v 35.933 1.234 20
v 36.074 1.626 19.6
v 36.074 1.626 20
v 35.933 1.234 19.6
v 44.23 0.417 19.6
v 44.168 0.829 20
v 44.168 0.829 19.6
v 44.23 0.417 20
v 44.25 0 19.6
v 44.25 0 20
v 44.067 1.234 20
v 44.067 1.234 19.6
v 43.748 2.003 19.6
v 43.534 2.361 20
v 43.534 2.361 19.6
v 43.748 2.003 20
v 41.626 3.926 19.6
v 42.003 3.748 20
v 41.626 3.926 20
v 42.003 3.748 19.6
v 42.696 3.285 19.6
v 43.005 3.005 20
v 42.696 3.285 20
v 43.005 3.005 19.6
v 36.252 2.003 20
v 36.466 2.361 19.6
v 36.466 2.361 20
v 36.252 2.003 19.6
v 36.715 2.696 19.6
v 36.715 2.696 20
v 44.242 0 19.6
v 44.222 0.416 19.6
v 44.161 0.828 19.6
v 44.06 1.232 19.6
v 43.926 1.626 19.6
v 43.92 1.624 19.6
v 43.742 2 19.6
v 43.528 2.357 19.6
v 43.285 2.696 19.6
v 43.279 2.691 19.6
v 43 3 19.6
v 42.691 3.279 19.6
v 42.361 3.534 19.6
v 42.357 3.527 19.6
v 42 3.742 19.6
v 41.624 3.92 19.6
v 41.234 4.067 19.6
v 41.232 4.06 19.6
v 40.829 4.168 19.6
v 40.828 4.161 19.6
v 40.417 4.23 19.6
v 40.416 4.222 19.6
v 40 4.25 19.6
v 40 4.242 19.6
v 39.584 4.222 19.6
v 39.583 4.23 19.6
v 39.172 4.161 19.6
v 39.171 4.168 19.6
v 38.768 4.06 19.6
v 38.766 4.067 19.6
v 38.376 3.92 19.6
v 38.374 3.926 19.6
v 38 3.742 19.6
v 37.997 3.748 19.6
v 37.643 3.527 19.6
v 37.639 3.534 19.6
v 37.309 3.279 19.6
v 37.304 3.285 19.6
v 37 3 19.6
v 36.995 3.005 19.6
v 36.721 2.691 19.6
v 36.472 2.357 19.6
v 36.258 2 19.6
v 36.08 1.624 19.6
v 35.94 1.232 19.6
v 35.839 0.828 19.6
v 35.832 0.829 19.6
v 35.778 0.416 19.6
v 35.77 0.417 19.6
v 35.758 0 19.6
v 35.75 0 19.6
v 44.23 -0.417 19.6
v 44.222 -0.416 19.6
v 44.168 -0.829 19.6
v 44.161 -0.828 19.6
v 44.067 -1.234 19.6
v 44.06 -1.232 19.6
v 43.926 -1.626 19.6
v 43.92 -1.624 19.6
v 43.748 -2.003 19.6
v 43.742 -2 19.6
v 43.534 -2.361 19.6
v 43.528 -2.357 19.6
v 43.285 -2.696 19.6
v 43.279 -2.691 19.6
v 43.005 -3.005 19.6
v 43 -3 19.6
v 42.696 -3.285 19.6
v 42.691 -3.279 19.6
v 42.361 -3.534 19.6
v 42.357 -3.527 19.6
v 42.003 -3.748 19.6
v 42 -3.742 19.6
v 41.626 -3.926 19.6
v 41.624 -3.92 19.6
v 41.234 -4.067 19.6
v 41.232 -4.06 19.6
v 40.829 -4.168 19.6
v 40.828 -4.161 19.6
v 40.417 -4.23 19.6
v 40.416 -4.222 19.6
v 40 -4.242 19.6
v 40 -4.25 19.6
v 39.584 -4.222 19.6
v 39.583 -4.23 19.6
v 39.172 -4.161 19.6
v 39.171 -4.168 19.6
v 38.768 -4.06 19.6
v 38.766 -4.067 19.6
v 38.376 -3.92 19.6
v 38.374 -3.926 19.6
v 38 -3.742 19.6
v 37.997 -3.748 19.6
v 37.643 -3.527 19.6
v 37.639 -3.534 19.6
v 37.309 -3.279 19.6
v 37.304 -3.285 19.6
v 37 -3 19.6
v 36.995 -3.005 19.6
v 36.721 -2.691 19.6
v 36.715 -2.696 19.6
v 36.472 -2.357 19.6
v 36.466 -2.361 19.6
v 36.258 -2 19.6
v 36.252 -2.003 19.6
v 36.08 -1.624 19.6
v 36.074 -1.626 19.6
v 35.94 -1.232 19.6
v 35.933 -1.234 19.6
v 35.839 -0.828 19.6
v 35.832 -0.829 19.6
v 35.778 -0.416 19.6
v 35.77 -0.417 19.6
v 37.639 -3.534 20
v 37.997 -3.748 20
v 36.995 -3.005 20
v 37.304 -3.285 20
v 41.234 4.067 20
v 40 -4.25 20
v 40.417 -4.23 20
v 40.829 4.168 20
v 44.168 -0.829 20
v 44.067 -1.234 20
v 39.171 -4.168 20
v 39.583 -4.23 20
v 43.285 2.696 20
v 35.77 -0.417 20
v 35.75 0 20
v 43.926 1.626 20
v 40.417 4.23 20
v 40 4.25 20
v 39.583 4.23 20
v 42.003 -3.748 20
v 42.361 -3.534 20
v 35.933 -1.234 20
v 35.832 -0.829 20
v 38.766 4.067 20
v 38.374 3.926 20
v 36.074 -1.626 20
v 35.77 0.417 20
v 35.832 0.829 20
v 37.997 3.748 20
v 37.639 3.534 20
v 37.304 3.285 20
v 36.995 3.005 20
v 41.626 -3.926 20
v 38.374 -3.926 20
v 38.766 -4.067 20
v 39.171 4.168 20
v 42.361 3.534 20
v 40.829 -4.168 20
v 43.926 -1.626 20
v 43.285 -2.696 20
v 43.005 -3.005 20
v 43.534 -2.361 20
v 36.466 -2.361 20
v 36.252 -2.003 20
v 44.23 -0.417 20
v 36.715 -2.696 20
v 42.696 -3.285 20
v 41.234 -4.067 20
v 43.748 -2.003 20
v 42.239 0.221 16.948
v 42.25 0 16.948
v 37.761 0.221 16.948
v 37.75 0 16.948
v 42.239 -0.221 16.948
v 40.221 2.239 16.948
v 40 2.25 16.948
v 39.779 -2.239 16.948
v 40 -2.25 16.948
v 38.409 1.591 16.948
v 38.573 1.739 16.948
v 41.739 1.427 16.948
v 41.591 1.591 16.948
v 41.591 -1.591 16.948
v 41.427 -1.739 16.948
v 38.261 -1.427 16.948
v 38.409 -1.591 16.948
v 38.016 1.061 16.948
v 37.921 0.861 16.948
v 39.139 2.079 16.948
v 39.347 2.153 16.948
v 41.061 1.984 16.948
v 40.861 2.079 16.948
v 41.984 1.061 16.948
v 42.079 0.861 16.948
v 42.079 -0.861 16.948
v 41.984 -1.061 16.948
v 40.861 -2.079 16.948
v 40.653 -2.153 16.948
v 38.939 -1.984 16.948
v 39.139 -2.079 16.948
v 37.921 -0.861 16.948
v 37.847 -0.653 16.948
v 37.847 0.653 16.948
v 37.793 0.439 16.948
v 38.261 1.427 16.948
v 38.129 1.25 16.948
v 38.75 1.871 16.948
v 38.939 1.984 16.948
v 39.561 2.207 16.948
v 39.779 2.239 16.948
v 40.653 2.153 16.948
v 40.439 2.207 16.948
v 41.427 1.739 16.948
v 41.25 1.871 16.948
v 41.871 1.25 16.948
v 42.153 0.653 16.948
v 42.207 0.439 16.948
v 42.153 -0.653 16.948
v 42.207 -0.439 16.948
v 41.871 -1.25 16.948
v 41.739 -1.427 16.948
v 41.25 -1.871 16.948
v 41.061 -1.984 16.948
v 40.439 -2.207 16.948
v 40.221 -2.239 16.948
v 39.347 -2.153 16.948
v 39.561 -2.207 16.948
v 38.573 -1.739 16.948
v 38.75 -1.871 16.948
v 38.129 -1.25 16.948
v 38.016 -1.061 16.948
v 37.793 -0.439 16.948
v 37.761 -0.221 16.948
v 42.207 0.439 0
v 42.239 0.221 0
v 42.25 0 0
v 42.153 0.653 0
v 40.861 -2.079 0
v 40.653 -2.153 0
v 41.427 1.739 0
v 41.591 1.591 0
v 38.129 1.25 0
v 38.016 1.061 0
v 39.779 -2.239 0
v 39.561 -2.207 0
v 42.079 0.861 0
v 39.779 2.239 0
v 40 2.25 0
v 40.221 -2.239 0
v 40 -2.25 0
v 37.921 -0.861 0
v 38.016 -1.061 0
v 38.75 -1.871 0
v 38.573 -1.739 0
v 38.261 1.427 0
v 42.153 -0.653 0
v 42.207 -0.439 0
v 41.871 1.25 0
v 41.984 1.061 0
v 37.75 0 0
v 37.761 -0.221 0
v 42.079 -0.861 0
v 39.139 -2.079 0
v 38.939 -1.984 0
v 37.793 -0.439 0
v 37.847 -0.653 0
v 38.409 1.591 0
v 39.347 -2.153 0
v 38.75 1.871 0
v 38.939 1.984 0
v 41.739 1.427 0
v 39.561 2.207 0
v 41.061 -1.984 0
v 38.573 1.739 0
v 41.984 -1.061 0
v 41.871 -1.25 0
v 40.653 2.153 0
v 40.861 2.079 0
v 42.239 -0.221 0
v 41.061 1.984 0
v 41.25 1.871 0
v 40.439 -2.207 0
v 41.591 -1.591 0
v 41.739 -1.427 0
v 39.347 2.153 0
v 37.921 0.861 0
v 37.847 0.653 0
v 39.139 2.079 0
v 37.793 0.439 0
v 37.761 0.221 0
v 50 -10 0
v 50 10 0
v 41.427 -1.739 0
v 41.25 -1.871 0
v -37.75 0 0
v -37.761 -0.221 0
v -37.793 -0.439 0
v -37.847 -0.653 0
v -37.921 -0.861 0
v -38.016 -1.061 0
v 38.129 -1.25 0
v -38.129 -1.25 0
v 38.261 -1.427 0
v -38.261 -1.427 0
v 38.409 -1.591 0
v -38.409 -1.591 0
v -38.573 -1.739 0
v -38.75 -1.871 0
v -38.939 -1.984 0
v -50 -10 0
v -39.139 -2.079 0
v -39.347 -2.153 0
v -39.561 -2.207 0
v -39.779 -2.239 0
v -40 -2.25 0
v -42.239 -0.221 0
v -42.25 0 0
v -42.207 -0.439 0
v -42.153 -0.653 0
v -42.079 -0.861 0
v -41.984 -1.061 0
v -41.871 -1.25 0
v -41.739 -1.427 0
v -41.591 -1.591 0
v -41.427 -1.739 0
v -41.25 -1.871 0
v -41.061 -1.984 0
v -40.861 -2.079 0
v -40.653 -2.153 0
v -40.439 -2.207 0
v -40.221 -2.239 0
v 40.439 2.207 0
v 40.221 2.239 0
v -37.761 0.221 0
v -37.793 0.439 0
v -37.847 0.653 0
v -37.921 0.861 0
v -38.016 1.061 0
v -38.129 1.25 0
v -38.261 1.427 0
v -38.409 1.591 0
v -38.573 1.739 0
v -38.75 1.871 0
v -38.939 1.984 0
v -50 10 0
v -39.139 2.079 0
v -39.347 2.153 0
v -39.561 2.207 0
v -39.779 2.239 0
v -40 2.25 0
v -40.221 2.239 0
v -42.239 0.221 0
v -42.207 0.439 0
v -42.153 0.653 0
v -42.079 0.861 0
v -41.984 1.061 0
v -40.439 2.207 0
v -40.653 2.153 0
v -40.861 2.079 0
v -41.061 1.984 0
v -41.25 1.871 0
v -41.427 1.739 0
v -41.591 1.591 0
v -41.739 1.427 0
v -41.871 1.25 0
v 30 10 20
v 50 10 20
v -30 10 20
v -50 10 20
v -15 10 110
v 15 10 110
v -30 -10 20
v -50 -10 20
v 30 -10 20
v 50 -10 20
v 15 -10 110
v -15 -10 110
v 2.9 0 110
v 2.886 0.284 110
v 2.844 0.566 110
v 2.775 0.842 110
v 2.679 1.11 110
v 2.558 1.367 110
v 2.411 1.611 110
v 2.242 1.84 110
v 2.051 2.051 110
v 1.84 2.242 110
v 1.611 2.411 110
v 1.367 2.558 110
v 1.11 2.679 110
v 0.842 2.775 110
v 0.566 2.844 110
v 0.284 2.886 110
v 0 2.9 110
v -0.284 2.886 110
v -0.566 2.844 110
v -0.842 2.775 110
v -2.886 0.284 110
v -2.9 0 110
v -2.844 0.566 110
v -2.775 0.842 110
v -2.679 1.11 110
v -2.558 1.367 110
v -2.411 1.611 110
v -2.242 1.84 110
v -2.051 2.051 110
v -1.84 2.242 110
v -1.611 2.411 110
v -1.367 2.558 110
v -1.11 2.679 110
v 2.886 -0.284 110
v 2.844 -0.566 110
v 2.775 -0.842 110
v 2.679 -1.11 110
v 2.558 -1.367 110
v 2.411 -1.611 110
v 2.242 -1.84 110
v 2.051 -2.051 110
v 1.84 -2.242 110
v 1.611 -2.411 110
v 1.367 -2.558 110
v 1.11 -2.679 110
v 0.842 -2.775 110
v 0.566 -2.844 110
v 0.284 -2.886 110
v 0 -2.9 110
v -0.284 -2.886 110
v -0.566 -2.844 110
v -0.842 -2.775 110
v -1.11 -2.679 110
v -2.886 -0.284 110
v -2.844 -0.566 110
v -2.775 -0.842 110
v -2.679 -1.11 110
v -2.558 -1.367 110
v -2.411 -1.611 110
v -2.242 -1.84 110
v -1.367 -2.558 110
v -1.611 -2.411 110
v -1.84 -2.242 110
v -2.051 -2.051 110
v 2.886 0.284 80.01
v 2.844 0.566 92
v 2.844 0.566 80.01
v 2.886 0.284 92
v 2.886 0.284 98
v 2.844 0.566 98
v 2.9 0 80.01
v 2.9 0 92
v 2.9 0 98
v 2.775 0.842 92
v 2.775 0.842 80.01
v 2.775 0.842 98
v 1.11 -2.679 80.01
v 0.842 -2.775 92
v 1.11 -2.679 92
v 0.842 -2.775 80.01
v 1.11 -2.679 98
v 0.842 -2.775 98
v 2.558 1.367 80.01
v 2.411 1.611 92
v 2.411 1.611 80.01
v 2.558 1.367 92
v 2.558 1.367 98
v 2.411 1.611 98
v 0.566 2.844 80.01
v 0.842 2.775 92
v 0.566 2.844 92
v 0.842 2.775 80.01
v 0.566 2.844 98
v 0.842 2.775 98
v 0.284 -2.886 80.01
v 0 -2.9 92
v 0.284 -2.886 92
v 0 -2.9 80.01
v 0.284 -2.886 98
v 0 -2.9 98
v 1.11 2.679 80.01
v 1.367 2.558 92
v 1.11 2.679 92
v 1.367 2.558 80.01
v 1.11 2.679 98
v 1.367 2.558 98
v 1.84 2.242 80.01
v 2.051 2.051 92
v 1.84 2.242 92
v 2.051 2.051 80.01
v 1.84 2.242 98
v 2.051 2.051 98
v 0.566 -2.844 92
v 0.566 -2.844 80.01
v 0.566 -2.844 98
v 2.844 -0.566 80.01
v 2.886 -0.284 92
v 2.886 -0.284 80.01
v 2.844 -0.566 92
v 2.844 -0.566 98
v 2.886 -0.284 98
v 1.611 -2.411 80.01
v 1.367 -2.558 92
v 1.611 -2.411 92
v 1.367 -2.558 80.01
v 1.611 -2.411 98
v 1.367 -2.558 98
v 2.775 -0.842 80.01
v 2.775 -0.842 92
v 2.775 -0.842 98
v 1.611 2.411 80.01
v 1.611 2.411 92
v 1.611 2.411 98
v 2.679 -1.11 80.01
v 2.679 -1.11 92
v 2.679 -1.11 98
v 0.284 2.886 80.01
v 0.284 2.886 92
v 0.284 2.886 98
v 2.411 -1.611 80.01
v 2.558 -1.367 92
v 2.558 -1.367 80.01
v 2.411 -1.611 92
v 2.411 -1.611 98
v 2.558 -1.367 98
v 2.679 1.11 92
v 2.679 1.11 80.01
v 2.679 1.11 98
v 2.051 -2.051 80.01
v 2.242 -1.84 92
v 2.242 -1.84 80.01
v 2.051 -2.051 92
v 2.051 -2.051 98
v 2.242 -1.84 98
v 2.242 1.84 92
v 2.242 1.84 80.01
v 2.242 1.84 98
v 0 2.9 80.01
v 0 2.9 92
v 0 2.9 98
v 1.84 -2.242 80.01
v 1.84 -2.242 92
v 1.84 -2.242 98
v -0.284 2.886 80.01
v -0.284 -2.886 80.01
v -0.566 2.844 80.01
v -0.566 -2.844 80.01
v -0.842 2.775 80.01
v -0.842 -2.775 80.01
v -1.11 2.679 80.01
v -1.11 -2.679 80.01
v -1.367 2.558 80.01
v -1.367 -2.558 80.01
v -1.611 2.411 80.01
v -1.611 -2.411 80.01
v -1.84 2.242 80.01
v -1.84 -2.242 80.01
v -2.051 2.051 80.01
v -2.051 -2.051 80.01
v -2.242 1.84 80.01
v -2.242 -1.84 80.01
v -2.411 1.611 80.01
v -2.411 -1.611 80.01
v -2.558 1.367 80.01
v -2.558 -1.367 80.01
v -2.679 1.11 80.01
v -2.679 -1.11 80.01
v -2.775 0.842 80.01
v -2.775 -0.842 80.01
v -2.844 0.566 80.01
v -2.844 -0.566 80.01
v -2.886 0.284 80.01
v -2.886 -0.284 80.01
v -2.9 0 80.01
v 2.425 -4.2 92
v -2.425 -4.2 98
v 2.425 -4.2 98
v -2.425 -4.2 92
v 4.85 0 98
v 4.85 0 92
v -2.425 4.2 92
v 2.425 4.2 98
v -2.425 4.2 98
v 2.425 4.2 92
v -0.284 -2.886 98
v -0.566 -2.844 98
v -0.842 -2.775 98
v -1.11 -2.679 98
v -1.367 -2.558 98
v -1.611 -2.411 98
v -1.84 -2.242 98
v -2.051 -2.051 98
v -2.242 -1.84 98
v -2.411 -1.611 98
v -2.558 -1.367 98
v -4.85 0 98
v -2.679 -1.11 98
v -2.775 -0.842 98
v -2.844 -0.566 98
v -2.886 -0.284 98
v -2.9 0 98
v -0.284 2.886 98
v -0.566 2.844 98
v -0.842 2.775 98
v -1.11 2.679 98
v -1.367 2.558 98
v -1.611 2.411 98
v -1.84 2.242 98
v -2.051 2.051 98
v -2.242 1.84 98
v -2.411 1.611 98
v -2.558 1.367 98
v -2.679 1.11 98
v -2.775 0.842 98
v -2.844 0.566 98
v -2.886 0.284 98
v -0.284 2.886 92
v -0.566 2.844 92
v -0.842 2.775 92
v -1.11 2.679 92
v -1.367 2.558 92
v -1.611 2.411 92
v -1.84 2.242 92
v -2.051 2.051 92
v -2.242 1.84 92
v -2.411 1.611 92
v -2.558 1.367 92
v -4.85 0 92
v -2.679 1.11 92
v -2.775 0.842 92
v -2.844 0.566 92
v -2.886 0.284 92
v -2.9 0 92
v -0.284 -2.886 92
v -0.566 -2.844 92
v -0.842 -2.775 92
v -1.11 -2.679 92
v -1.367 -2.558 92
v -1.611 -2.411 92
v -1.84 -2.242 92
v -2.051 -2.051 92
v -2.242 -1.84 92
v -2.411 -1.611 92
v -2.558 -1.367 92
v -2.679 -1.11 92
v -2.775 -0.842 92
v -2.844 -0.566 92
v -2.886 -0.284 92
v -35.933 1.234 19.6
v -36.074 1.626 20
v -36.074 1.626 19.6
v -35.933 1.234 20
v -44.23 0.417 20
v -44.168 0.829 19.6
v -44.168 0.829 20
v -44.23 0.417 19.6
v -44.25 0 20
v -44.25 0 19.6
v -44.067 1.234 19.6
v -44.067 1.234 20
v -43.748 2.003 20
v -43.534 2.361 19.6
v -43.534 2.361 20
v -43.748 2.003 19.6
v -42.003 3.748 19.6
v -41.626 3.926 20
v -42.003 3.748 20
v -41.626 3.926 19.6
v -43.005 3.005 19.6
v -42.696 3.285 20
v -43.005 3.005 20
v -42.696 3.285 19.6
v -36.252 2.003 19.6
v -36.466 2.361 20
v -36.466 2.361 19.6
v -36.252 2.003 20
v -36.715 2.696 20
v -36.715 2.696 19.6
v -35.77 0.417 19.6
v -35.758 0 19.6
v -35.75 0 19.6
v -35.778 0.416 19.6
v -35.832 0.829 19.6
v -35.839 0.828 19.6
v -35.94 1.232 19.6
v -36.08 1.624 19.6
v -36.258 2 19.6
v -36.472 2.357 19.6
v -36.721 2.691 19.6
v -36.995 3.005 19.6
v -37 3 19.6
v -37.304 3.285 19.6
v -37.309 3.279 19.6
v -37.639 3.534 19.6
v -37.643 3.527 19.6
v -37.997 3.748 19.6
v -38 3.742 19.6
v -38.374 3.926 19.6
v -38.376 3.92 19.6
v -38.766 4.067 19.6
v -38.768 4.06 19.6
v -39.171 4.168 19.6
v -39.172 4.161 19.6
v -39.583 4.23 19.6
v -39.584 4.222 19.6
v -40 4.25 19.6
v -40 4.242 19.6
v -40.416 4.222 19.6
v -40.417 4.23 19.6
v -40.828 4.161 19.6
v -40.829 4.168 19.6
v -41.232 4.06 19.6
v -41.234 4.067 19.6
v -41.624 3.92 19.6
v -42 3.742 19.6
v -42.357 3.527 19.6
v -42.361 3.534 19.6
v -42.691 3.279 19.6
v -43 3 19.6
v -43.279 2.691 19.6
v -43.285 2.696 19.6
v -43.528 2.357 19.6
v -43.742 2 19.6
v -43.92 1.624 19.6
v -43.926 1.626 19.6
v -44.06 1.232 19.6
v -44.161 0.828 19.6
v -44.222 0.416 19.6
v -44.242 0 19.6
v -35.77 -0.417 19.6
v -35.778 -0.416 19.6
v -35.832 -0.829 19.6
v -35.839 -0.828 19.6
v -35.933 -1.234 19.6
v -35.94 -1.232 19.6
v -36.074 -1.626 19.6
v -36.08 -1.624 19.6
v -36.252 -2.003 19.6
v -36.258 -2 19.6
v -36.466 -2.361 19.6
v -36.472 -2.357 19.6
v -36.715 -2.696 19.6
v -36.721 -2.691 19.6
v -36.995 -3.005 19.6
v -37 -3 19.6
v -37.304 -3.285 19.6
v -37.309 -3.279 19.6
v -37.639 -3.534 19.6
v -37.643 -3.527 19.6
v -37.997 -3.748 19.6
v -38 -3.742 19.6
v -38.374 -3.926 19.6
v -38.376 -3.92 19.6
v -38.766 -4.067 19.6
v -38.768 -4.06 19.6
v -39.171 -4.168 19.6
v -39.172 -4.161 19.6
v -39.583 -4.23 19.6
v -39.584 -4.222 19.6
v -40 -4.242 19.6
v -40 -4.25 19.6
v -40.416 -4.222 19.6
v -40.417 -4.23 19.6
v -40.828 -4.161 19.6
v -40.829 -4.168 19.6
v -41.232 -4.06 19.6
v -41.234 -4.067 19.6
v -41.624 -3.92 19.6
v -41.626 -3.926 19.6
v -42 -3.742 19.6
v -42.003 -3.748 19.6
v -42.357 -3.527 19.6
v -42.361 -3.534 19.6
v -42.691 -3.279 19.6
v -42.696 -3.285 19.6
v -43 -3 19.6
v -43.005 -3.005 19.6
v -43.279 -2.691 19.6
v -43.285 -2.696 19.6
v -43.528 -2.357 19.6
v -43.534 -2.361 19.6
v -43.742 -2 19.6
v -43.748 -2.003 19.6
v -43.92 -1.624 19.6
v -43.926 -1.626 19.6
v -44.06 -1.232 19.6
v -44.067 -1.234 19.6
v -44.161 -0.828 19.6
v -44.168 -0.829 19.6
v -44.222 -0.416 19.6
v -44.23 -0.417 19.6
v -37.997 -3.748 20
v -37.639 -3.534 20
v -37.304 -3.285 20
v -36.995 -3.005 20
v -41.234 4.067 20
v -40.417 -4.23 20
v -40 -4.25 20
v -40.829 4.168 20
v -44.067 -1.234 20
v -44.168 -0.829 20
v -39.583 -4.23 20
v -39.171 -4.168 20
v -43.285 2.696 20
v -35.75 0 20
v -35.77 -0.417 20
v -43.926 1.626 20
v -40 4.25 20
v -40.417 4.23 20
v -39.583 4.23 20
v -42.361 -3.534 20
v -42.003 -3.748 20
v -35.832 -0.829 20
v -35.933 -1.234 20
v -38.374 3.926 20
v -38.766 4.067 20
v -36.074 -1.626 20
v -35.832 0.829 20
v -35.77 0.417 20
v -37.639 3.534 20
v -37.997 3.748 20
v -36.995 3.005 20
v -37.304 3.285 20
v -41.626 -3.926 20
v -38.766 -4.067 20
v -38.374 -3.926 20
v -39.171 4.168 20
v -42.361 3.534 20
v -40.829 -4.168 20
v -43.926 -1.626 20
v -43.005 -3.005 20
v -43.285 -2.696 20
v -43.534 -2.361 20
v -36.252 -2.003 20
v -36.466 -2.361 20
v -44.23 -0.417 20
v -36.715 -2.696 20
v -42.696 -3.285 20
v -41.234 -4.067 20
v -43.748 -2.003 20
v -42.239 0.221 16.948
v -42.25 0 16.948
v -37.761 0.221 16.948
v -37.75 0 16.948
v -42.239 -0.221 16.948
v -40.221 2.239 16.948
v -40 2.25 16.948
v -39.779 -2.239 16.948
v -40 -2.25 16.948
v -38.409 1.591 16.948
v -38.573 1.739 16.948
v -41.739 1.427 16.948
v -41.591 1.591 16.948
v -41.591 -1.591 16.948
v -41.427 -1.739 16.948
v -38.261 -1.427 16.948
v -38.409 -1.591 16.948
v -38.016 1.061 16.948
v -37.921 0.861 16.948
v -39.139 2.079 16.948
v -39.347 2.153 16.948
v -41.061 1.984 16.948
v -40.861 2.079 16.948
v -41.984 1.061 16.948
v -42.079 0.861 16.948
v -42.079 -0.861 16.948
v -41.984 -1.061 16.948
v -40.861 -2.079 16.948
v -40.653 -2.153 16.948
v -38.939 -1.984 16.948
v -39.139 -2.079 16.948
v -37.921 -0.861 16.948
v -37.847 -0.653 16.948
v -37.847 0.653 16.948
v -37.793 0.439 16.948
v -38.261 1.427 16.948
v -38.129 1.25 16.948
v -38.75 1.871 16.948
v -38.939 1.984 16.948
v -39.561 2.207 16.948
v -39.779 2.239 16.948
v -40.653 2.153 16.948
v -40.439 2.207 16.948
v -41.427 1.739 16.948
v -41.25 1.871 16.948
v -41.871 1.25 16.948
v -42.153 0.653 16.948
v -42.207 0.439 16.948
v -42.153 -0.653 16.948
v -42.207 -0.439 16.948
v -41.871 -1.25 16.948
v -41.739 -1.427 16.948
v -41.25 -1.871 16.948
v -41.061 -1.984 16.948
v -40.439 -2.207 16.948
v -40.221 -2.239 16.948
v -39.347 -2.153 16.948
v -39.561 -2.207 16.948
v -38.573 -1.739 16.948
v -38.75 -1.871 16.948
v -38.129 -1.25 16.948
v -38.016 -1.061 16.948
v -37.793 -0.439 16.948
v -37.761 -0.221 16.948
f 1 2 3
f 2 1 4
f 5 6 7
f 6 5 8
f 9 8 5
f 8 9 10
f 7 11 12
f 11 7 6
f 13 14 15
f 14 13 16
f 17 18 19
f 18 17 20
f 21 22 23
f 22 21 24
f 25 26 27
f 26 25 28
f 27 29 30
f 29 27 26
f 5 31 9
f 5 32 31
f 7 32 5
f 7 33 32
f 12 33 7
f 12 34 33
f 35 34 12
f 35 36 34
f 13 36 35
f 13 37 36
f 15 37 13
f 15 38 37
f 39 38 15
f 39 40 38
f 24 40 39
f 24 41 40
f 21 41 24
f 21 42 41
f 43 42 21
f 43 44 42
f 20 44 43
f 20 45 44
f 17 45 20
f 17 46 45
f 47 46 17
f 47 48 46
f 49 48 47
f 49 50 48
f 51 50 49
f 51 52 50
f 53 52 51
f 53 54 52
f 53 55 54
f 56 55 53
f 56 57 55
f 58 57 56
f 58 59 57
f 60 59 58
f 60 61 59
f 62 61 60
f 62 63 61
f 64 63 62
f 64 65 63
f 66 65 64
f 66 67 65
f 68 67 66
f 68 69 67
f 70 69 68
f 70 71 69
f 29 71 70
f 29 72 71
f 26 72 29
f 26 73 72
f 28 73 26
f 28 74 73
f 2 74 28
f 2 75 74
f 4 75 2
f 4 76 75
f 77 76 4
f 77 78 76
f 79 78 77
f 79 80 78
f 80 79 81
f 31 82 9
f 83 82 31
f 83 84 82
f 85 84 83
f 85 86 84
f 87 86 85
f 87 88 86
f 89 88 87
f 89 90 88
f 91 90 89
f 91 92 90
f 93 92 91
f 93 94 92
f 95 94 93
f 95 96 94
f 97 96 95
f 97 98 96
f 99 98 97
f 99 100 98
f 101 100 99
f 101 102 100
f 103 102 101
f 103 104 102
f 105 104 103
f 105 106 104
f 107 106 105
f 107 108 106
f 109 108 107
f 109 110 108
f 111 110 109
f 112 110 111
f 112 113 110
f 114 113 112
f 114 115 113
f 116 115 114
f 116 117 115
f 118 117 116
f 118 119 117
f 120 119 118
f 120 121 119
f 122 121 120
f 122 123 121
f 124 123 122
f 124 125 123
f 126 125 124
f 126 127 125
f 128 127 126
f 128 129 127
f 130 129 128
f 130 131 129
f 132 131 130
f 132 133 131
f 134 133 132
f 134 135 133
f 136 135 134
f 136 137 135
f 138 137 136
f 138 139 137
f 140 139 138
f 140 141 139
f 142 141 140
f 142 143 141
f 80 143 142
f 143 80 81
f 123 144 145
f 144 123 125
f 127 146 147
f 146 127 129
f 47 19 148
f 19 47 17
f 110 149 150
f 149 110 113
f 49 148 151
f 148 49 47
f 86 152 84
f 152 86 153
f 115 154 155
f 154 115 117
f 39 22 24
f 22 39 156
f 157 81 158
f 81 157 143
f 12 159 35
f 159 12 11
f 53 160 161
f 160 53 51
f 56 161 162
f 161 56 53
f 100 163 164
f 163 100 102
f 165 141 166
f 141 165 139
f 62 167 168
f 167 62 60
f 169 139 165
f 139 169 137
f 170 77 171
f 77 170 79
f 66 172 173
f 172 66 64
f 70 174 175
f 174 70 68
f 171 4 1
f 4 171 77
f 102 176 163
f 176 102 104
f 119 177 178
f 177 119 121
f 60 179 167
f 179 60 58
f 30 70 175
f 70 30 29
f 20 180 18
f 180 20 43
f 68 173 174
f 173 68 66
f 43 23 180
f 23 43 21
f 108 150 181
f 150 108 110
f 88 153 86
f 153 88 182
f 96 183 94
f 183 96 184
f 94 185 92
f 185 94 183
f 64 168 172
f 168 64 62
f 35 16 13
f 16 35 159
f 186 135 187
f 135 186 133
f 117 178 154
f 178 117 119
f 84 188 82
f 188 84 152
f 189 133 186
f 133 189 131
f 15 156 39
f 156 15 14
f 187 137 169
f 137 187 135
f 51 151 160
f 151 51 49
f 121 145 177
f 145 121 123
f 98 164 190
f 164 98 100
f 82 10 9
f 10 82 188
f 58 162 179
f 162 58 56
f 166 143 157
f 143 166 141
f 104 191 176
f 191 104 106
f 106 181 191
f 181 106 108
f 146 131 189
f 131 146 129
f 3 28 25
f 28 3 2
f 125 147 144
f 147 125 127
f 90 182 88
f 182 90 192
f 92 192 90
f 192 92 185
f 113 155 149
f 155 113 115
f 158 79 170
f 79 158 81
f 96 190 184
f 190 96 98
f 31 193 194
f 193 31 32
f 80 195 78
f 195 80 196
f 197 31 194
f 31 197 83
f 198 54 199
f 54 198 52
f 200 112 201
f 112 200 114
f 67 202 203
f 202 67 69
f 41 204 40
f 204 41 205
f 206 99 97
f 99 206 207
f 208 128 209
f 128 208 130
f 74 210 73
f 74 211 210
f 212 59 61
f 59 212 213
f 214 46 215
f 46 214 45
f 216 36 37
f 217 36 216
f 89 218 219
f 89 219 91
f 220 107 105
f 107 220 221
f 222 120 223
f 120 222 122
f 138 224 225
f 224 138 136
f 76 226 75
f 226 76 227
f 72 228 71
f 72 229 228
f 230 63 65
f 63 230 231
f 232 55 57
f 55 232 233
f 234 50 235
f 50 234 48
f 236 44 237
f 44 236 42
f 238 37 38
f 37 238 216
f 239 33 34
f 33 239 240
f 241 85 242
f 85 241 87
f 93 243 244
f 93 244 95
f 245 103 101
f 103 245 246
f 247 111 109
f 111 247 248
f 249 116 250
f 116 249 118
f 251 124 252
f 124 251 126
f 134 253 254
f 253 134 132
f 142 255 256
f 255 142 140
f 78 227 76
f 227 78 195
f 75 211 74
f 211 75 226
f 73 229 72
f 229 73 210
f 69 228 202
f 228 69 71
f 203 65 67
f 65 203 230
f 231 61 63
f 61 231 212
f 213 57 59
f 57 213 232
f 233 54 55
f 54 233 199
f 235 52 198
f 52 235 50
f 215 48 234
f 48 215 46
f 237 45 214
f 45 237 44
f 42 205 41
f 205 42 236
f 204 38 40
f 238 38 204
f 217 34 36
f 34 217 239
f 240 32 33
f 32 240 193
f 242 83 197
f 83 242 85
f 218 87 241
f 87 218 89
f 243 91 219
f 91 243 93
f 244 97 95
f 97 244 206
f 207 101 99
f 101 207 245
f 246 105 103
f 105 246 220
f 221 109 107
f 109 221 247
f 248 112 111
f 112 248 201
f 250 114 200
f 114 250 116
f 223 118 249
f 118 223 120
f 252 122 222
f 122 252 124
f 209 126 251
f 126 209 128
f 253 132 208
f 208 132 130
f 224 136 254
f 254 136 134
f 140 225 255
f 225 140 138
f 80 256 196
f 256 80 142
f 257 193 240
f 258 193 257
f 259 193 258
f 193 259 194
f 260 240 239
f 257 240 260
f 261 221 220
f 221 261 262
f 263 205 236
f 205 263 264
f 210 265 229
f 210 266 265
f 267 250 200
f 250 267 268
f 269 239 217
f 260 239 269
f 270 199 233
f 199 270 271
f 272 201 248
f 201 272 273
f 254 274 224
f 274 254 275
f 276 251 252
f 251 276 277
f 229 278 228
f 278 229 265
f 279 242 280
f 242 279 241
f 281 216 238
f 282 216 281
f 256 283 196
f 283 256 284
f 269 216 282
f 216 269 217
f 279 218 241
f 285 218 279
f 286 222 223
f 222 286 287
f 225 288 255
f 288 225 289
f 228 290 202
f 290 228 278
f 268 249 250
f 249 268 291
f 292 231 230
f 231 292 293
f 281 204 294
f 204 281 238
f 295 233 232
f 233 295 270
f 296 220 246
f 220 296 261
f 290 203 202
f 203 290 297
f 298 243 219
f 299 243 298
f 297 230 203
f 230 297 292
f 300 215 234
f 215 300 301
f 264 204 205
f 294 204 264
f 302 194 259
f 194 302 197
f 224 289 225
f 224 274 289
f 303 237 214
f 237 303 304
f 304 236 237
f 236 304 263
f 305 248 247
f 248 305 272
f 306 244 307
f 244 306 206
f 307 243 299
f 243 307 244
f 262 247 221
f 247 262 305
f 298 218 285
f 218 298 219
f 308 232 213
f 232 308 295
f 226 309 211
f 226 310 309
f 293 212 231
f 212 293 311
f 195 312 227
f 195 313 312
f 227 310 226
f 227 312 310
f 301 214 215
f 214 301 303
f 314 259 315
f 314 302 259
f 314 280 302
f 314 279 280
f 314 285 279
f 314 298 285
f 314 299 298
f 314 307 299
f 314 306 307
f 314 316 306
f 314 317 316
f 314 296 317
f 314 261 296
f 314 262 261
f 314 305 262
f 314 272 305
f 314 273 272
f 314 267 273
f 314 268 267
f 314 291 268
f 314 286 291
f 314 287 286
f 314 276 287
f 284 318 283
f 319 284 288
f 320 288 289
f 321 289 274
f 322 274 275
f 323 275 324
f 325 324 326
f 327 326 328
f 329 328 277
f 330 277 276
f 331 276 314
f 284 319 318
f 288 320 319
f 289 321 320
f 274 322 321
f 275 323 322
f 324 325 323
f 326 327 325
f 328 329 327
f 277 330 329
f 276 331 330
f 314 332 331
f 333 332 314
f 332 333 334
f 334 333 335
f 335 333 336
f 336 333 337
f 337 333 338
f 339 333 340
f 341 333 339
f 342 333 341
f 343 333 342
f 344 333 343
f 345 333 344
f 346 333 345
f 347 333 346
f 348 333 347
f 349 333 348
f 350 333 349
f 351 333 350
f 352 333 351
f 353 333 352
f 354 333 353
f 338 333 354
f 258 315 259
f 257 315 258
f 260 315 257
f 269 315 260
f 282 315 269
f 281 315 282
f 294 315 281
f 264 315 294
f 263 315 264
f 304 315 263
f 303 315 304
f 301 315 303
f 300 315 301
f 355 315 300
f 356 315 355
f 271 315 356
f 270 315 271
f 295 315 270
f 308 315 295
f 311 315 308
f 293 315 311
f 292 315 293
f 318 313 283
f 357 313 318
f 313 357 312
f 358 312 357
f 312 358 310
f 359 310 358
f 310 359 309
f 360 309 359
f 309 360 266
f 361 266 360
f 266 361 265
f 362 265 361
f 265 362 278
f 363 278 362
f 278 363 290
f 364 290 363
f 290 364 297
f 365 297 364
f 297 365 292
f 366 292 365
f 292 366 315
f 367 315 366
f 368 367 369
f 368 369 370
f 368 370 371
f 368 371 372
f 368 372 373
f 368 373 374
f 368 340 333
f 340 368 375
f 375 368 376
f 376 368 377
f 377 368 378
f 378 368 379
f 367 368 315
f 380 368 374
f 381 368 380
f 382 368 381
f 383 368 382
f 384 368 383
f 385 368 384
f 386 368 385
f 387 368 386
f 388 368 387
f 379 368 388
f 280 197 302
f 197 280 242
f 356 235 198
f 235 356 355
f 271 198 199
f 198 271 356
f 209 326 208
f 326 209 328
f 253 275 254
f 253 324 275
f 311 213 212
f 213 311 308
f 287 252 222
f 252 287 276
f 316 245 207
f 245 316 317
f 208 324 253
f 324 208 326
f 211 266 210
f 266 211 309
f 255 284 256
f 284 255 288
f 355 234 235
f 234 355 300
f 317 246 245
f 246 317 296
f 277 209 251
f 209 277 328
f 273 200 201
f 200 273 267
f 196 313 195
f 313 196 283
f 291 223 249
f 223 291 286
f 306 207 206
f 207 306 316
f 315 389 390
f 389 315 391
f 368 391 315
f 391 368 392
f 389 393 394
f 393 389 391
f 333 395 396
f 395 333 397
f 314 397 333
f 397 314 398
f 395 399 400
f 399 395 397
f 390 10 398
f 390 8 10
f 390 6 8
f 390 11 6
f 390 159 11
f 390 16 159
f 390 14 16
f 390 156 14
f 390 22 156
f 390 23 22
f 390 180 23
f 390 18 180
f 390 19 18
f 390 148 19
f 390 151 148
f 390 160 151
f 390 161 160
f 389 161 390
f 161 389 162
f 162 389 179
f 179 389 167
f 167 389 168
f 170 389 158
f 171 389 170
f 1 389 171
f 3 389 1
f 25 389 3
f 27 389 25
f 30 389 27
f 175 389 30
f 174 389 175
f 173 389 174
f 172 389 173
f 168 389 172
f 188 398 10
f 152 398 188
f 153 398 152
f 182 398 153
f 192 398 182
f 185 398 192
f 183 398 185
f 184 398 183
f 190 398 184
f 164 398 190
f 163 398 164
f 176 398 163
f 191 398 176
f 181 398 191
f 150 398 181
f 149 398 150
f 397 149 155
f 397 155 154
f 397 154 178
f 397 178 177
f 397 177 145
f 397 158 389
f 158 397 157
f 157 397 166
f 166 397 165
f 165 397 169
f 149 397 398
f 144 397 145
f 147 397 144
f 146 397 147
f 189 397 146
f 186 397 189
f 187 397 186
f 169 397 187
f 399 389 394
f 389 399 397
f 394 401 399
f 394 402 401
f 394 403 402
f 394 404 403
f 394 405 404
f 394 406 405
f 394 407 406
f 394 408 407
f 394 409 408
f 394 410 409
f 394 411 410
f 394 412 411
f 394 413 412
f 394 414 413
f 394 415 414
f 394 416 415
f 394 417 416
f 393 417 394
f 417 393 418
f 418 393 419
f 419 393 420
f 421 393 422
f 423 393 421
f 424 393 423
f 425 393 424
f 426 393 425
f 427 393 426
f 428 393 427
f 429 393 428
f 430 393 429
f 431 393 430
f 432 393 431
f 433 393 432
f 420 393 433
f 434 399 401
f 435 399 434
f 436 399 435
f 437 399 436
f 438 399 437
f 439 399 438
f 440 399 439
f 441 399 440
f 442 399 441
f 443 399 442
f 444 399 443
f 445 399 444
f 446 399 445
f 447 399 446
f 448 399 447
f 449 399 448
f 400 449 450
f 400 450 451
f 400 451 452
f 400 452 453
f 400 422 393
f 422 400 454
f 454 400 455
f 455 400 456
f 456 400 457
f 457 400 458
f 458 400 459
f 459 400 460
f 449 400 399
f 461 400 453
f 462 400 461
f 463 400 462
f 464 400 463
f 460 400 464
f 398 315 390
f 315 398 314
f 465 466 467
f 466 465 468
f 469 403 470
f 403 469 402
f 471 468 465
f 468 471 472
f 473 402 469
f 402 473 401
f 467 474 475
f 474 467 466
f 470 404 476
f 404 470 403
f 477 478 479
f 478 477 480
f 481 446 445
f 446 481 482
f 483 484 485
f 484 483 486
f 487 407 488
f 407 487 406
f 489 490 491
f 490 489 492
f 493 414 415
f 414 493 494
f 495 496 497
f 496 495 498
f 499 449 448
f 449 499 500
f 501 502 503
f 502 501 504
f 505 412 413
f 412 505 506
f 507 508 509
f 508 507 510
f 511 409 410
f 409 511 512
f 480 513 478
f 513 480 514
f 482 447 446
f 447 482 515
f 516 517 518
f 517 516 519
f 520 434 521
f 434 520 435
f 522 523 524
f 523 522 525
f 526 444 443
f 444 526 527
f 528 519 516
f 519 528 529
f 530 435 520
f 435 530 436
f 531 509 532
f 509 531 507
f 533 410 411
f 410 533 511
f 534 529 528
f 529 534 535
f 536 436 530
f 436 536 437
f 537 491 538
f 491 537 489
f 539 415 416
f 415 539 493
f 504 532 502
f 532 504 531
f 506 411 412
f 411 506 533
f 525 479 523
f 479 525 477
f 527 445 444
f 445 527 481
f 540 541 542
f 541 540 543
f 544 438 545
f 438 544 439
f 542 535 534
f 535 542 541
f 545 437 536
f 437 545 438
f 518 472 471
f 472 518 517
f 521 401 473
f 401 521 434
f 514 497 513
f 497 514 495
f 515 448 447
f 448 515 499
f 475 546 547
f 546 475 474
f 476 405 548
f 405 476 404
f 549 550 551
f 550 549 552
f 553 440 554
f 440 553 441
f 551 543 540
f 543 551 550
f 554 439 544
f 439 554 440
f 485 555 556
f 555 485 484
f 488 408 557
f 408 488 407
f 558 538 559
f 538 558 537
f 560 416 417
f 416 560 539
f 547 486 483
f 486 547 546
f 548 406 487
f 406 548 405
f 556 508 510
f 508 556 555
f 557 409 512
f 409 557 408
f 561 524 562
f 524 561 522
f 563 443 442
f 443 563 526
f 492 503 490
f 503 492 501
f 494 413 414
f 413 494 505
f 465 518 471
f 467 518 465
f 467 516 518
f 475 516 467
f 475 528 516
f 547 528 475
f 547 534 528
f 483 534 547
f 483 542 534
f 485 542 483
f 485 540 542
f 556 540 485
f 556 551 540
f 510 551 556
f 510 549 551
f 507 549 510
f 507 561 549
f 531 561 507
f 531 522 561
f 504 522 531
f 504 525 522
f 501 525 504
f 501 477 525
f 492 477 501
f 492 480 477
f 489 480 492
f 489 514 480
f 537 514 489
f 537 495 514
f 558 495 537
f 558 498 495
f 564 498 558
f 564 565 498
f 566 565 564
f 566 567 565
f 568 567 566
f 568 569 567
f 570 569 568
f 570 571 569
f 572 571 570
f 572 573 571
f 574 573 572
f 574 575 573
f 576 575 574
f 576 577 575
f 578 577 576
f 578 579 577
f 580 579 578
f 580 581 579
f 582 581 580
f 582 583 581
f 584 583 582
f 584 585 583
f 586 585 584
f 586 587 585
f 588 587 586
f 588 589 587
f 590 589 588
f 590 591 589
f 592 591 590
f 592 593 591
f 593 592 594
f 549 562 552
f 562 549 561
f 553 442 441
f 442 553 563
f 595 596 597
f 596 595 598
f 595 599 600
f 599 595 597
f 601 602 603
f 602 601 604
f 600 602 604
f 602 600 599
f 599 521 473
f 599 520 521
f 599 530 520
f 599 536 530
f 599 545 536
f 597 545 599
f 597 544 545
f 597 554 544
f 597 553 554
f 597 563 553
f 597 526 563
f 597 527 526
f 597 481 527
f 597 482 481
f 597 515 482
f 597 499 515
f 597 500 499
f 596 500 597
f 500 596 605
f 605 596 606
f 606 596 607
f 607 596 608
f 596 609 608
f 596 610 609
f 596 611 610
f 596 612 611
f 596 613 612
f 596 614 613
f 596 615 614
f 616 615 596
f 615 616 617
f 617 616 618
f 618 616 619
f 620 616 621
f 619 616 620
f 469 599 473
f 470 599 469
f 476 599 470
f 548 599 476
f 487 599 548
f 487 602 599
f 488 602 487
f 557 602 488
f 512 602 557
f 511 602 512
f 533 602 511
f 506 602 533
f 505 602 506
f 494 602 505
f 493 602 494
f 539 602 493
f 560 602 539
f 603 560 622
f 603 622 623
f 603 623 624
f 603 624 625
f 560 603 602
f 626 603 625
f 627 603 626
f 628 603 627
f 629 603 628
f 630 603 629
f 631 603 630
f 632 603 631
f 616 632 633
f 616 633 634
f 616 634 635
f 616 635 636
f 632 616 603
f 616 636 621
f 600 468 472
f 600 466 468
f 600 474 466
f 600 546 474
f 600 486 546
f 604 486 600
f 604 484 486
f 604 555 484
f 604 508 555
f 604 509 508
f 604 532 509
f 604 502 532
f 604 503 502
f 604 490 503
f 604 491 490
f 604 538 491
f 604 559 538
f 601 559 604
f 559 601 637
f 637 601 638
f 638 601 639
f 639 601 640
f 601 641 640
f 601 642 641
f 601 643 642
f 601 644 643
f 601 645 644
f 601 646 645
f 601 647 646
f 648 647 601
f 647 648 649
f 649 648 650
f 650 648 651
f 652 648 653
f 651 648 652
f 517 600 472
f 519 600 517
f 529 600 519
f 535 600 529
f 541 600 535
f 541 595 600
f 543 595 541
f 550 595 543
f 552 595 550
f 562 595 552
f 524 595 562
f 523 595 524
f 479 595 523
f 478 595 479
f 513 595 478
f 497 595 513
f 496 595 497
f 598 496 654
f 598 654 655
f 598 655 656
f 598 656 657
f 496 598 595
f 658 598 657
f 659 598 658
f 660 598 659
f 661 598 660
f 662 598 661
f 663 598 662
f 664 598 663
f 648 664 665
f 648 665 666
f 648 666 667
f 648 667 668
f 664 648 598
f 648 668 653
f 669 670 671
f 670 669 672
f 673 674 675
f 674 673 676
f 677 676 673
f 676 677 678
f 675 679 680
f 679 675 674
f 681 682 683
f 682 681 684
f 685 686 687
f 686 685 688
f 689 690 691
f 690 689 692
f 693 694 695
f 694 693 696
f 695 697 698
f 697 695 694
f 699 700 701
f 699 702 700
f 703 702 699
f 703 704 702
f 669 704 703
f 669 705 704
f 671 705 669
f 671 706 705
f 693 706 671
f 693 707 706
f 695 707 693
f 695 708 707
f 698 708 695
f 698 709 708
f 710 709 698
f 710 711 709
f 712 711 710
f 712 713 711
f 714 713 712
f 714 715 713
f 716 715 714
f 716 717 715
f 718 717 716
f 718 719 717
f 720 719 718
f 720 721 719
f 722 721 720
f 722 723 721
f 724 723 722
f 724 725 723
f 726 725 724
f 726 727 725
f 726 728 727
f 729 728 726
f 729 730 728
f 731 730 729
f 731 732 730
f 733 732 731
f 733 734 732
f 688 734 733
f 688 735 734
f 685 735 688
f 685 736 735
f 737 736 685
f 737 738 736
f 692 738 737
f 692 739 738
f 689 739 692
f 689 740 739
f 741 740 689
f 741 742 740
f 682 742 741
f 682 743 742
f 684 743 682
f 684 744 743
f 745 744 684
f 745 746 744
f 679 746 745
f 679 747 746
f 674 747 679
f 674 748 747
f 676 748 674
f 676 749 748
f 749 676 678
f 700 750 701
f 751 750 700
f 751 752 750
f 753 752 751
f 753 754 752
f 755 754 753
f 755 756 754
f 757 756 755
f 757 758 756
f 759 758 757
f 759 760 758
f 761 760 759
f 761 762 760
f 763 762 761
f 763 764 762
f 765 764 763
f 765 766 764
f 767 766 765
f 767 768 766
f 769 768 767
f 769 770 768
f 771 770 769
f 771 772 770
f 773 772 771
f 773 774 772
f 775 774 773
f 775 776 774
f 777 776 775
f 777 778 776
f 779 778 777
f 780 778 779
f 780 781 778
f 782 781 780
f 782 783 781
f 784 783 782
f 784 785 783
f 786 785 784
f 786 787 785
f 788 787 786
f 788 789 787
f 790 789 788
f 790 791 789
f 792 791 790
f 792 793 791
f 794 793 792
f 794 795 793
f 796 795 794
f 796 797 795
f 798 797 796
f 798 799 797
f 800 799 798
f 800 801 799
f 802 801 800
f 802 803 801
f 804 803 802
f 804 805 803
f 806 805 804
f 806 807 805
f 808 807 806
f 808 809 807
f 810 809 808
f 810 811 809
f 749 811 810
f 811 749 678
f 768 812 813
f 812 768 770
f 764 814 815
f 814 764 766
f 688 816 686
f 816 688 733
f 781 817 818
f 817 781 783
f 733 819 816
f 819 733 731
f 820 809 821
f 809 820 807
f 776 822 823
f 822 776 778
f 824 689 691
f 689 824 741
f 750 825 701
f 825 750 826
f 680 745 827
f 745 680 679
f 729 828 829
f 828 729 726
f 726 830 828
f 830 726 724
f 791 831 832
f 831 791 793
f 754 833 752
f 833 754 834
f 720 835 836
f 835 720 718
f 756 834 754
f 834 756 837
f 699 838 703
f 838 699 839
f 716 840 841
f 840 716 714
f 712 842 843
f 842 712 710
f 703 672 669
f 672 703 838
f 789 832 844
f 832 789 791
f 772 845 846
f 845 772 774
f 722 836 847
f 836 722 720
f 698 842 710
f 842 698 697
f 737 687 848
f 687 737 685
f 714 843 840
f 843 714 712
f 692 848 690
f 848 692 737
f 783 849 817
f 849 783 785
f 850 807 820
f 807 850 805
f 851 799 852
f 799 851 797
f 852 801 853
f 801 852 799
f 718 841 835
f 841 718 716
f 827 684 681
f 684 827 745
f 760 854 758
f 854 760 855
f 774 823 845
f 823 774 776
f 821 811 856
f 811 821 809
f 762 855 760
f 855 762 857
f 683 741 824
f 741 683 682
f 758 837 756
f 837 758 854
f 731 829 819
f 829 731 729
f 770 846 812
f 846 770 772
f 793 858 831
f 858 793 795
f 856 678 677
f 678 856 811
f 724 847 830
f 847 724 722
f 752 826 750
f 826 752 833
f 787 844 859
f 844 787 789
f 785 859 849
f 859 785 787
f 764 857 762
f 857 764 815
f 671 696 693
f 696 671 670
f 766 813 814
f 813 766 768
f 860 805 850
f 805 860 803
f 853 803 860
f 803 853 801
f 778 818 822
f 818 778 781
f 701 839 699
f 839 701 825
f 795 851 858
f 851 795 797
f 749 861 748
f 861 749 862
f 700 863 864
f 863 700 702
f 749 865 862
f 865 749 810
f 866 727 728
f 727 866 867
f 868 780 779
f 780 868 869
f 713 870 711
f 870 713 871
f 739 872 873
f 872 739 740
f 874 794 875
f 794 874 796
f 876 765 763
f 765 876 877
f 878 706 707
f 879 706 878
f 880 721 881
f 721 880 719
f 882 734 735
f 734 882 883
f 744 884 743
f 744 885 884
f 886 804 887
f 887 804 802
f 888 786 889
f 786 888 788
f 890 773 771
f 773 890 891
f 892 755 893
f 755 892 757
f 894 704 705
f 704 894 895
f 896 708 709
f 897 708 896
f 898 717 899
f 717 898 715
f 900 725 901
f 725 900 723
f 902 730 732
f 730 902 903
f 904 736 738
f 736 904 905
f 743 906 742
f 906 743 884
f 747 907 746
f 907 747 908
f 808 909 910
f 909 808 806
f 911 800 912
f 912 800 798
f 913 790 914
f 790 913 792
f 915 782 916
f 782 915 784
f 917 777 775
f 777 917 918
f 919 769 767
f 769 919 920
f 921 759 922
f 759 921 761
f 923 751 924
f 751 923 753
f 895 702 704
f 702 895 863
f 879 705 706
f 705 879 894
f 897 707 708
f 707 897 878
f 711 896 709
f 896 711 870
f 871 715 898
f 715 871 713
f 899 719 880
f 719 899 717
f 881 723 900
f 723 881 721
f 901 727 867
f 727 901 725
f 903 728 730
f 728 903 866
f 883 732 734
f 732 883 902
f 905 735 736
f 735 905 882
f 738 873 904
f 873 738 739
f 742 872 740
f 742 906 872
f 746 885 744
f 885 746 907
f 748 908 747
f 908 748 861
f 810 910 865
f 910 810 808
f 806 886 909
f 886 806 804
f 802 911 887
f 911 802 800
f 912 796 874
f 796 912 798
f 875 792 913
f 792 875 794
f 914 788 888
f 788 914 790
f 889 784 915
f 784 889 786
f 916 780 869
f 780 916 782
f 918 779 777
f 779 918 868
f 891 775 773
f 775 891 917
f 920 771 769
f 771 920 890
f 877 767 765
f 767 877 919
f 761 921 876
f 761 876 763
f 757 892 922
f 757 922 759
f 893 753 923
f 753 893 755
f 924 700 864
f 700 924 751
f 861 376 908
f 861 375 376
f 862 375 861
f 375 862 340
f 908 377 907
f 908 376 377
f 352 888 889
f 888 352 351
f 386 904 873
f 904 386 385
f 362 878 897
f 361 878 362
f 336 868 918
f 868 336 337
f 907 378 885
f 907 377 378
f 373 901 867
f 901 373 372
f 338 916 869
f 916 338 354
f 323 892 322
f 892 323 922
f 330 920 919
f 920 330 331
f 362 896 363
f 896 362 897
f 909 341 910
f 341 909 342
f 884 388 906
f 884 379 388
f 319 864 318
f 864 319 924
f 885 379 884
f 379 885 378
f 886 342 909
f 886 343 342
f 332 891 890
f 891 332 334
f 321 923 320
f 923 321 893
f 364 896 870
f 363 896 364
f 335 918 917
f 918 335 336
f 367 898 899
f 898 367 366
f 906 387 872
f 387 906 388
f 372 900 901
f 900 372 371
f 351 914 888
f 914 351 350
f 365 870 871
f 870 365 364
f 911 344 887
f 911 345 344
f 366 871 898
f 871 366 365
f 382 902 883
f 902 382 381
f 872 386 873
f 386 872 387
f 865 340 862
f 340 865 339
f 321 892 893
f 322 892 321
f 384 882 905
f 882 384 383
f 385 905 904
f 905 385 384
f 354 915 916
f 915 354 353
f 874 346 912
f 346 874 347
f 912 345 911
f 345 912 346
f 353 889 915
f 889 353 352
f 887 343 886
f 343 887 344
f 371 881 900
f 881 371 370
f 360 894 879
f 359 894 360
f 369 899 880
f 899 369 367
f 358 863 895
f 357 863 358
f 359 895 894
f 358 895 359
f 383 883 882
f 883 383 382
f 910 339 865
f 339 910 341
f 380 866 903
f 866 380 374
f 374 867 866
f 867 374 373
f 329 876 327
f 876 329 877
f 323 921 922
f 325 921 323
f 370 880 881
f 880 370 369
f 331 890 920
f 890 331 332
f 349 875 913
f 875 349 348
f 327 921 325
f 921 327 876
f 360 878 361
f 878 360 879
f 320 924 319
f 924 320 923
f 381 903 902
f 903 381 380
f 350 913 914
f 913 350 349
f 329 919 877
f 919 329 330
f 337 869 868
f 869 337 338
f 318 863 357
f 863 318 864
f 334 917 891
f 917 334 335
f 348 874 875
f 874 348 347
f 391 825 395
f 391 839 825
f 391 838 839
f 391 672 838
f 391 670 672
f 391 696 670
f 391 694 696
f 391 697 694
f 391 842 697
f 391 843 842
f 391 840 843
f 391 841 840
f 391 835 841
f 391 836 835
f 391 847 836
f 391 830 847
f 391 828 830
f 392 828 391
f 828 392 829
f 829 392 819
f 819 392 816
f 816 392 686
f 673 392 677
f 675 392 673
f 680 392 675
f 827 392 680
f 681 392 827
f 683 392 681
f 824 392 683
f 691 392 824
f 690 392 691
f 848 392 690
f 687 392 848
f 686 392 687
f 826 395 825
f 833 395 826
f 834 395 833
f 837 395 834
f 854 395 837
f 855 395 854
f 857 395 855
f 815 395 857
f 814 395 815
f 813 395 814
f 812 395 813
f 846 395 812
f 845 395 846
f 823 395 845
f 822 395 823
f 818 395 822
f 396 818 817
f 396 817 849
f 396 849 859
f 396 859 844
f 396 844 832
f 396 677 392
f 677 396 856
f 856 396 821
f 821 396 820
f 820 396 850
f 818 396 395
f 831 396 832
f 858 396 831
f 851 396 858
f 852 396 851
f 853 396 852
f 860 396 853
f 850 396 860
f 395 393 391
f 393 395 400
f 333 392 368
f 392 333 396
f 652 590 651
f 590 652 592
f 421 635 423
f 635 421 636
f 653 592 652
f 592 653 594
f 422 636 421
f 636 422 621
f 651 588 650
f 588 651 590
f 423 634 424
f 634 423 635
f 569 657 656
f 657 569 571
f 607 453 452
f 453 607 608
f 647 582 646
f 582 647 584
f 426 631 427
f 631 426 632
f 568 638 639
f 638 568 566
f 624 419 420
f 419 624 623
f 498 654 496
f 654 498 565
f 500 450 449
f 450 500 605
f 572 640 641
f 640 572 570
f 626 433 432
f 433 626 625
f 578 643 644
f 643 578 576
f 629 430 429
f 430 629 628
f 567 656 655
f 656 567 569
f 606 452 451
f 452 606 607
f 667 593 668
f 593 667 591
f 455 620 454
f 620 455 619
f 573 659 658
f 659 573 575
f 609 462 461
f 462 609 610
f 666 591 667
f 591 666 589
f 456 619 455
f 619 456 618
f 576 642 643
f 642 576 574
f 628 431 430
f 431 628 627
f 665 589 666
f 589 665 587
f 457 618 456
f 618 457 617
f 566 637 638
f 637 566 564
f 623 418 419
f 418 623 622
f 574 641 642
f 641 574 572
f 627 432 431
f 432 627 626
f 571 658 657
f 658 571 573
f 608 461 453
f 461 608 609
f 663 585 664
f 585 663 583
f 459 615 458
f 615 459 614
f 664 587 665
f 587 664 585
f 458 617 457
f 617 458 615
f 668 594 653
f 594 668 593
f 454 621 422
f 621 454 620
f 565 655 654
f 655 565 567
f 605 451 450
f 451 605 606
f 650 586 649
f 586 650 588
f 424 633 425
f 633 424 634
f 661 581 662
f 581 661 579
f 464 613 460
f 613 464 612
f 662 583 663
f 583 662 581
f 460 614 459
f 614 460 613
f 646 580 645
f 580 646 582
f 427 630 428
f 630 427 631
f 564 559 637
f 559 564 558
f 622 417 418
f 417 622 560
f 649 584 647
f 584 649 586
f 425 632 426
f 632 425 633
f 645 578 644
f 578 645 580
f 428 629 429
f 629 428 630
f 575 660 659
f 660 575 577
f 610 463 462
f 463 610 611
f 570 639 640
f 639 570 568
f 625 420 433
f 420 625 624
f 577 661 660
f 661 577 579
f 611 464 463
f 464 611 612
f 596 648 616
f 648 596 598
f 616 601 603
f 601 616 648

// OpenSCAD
$fn = $preview ? 16 : 64;

bottomLength = 100;
topLength = 30;
topScrewDepth = 20;
partWidth = 20;
partHeight = 110;
earDepth = 20;
earWidth = 20;

module basePartHalf()
{
    rotate([90,0,0])
    linear_extrude(partWidth, center=true)
    {
        polygon([
            [0,0],
            [bottomLength/2,0],
            [bottomLength/2,earDepth],
            [bottomLength/2-earWidth,earDepth],
            [topLength/2,partHeight],
            [0,partHeight]
            ]);
    }
}

// 4x30 countersink wood screw
bottomScrewHeadDiameter = 8.5; // nominal 8
bottomScrewDiameter = 4.5; // nominal 4
bottomScrewExtraSink = 0.4;
bottomScrewSinkDepth = (bottomScrewHeadDiameter-bottomScrewDiameter)*sqrt(2);

// M5x30
topScrewDiameter = 5.8;
topScrewNutDiameter = 8.4 * (2/sqrt(3)); // 8mm + tolerance

topScrewInnerLength = 30;
topScrewNutPos = 12;
topScrewNutHeight = 6; // 5mm + tolerance

module partHalf()
{
    difference()
    {
        basePartHalf();
        
        translate([0,0,partHeight-topScrewInnerLength +0.01])
            cylinder(d=topScrewDiameter, h=topScrewInnerLength);
        translate([0,0,partHeight - topScrewNutPos - topScrewNutHeight])
            cylinder(d=topScrewNutDiameter, h=topScrewNutHeight, $fn = 6);
        
        translate([bottomLength/2-earWidth/2, 0, 0])
        {
            cylinder(d=bottomScrewDiameter, h=1000);
            translate([0,0,earDepth - bottomScrewExtraSink])
            {
                cylinder(h=1000, d=bottomScrewHeadDiameter);
                translate([0,0,-bottomScrewSinkDepth + 0.01])
                    cylinder(h=bottomScrewSinkDepth, d1=0, d2=bottomScrewHeadDiameter);
            }
        }
    }
}

if($preview)
{
    partHalf();
}
else
{
    union()
    {
        partHalf();
        mirror([1,0,0])
            partHalf();
    }
}
